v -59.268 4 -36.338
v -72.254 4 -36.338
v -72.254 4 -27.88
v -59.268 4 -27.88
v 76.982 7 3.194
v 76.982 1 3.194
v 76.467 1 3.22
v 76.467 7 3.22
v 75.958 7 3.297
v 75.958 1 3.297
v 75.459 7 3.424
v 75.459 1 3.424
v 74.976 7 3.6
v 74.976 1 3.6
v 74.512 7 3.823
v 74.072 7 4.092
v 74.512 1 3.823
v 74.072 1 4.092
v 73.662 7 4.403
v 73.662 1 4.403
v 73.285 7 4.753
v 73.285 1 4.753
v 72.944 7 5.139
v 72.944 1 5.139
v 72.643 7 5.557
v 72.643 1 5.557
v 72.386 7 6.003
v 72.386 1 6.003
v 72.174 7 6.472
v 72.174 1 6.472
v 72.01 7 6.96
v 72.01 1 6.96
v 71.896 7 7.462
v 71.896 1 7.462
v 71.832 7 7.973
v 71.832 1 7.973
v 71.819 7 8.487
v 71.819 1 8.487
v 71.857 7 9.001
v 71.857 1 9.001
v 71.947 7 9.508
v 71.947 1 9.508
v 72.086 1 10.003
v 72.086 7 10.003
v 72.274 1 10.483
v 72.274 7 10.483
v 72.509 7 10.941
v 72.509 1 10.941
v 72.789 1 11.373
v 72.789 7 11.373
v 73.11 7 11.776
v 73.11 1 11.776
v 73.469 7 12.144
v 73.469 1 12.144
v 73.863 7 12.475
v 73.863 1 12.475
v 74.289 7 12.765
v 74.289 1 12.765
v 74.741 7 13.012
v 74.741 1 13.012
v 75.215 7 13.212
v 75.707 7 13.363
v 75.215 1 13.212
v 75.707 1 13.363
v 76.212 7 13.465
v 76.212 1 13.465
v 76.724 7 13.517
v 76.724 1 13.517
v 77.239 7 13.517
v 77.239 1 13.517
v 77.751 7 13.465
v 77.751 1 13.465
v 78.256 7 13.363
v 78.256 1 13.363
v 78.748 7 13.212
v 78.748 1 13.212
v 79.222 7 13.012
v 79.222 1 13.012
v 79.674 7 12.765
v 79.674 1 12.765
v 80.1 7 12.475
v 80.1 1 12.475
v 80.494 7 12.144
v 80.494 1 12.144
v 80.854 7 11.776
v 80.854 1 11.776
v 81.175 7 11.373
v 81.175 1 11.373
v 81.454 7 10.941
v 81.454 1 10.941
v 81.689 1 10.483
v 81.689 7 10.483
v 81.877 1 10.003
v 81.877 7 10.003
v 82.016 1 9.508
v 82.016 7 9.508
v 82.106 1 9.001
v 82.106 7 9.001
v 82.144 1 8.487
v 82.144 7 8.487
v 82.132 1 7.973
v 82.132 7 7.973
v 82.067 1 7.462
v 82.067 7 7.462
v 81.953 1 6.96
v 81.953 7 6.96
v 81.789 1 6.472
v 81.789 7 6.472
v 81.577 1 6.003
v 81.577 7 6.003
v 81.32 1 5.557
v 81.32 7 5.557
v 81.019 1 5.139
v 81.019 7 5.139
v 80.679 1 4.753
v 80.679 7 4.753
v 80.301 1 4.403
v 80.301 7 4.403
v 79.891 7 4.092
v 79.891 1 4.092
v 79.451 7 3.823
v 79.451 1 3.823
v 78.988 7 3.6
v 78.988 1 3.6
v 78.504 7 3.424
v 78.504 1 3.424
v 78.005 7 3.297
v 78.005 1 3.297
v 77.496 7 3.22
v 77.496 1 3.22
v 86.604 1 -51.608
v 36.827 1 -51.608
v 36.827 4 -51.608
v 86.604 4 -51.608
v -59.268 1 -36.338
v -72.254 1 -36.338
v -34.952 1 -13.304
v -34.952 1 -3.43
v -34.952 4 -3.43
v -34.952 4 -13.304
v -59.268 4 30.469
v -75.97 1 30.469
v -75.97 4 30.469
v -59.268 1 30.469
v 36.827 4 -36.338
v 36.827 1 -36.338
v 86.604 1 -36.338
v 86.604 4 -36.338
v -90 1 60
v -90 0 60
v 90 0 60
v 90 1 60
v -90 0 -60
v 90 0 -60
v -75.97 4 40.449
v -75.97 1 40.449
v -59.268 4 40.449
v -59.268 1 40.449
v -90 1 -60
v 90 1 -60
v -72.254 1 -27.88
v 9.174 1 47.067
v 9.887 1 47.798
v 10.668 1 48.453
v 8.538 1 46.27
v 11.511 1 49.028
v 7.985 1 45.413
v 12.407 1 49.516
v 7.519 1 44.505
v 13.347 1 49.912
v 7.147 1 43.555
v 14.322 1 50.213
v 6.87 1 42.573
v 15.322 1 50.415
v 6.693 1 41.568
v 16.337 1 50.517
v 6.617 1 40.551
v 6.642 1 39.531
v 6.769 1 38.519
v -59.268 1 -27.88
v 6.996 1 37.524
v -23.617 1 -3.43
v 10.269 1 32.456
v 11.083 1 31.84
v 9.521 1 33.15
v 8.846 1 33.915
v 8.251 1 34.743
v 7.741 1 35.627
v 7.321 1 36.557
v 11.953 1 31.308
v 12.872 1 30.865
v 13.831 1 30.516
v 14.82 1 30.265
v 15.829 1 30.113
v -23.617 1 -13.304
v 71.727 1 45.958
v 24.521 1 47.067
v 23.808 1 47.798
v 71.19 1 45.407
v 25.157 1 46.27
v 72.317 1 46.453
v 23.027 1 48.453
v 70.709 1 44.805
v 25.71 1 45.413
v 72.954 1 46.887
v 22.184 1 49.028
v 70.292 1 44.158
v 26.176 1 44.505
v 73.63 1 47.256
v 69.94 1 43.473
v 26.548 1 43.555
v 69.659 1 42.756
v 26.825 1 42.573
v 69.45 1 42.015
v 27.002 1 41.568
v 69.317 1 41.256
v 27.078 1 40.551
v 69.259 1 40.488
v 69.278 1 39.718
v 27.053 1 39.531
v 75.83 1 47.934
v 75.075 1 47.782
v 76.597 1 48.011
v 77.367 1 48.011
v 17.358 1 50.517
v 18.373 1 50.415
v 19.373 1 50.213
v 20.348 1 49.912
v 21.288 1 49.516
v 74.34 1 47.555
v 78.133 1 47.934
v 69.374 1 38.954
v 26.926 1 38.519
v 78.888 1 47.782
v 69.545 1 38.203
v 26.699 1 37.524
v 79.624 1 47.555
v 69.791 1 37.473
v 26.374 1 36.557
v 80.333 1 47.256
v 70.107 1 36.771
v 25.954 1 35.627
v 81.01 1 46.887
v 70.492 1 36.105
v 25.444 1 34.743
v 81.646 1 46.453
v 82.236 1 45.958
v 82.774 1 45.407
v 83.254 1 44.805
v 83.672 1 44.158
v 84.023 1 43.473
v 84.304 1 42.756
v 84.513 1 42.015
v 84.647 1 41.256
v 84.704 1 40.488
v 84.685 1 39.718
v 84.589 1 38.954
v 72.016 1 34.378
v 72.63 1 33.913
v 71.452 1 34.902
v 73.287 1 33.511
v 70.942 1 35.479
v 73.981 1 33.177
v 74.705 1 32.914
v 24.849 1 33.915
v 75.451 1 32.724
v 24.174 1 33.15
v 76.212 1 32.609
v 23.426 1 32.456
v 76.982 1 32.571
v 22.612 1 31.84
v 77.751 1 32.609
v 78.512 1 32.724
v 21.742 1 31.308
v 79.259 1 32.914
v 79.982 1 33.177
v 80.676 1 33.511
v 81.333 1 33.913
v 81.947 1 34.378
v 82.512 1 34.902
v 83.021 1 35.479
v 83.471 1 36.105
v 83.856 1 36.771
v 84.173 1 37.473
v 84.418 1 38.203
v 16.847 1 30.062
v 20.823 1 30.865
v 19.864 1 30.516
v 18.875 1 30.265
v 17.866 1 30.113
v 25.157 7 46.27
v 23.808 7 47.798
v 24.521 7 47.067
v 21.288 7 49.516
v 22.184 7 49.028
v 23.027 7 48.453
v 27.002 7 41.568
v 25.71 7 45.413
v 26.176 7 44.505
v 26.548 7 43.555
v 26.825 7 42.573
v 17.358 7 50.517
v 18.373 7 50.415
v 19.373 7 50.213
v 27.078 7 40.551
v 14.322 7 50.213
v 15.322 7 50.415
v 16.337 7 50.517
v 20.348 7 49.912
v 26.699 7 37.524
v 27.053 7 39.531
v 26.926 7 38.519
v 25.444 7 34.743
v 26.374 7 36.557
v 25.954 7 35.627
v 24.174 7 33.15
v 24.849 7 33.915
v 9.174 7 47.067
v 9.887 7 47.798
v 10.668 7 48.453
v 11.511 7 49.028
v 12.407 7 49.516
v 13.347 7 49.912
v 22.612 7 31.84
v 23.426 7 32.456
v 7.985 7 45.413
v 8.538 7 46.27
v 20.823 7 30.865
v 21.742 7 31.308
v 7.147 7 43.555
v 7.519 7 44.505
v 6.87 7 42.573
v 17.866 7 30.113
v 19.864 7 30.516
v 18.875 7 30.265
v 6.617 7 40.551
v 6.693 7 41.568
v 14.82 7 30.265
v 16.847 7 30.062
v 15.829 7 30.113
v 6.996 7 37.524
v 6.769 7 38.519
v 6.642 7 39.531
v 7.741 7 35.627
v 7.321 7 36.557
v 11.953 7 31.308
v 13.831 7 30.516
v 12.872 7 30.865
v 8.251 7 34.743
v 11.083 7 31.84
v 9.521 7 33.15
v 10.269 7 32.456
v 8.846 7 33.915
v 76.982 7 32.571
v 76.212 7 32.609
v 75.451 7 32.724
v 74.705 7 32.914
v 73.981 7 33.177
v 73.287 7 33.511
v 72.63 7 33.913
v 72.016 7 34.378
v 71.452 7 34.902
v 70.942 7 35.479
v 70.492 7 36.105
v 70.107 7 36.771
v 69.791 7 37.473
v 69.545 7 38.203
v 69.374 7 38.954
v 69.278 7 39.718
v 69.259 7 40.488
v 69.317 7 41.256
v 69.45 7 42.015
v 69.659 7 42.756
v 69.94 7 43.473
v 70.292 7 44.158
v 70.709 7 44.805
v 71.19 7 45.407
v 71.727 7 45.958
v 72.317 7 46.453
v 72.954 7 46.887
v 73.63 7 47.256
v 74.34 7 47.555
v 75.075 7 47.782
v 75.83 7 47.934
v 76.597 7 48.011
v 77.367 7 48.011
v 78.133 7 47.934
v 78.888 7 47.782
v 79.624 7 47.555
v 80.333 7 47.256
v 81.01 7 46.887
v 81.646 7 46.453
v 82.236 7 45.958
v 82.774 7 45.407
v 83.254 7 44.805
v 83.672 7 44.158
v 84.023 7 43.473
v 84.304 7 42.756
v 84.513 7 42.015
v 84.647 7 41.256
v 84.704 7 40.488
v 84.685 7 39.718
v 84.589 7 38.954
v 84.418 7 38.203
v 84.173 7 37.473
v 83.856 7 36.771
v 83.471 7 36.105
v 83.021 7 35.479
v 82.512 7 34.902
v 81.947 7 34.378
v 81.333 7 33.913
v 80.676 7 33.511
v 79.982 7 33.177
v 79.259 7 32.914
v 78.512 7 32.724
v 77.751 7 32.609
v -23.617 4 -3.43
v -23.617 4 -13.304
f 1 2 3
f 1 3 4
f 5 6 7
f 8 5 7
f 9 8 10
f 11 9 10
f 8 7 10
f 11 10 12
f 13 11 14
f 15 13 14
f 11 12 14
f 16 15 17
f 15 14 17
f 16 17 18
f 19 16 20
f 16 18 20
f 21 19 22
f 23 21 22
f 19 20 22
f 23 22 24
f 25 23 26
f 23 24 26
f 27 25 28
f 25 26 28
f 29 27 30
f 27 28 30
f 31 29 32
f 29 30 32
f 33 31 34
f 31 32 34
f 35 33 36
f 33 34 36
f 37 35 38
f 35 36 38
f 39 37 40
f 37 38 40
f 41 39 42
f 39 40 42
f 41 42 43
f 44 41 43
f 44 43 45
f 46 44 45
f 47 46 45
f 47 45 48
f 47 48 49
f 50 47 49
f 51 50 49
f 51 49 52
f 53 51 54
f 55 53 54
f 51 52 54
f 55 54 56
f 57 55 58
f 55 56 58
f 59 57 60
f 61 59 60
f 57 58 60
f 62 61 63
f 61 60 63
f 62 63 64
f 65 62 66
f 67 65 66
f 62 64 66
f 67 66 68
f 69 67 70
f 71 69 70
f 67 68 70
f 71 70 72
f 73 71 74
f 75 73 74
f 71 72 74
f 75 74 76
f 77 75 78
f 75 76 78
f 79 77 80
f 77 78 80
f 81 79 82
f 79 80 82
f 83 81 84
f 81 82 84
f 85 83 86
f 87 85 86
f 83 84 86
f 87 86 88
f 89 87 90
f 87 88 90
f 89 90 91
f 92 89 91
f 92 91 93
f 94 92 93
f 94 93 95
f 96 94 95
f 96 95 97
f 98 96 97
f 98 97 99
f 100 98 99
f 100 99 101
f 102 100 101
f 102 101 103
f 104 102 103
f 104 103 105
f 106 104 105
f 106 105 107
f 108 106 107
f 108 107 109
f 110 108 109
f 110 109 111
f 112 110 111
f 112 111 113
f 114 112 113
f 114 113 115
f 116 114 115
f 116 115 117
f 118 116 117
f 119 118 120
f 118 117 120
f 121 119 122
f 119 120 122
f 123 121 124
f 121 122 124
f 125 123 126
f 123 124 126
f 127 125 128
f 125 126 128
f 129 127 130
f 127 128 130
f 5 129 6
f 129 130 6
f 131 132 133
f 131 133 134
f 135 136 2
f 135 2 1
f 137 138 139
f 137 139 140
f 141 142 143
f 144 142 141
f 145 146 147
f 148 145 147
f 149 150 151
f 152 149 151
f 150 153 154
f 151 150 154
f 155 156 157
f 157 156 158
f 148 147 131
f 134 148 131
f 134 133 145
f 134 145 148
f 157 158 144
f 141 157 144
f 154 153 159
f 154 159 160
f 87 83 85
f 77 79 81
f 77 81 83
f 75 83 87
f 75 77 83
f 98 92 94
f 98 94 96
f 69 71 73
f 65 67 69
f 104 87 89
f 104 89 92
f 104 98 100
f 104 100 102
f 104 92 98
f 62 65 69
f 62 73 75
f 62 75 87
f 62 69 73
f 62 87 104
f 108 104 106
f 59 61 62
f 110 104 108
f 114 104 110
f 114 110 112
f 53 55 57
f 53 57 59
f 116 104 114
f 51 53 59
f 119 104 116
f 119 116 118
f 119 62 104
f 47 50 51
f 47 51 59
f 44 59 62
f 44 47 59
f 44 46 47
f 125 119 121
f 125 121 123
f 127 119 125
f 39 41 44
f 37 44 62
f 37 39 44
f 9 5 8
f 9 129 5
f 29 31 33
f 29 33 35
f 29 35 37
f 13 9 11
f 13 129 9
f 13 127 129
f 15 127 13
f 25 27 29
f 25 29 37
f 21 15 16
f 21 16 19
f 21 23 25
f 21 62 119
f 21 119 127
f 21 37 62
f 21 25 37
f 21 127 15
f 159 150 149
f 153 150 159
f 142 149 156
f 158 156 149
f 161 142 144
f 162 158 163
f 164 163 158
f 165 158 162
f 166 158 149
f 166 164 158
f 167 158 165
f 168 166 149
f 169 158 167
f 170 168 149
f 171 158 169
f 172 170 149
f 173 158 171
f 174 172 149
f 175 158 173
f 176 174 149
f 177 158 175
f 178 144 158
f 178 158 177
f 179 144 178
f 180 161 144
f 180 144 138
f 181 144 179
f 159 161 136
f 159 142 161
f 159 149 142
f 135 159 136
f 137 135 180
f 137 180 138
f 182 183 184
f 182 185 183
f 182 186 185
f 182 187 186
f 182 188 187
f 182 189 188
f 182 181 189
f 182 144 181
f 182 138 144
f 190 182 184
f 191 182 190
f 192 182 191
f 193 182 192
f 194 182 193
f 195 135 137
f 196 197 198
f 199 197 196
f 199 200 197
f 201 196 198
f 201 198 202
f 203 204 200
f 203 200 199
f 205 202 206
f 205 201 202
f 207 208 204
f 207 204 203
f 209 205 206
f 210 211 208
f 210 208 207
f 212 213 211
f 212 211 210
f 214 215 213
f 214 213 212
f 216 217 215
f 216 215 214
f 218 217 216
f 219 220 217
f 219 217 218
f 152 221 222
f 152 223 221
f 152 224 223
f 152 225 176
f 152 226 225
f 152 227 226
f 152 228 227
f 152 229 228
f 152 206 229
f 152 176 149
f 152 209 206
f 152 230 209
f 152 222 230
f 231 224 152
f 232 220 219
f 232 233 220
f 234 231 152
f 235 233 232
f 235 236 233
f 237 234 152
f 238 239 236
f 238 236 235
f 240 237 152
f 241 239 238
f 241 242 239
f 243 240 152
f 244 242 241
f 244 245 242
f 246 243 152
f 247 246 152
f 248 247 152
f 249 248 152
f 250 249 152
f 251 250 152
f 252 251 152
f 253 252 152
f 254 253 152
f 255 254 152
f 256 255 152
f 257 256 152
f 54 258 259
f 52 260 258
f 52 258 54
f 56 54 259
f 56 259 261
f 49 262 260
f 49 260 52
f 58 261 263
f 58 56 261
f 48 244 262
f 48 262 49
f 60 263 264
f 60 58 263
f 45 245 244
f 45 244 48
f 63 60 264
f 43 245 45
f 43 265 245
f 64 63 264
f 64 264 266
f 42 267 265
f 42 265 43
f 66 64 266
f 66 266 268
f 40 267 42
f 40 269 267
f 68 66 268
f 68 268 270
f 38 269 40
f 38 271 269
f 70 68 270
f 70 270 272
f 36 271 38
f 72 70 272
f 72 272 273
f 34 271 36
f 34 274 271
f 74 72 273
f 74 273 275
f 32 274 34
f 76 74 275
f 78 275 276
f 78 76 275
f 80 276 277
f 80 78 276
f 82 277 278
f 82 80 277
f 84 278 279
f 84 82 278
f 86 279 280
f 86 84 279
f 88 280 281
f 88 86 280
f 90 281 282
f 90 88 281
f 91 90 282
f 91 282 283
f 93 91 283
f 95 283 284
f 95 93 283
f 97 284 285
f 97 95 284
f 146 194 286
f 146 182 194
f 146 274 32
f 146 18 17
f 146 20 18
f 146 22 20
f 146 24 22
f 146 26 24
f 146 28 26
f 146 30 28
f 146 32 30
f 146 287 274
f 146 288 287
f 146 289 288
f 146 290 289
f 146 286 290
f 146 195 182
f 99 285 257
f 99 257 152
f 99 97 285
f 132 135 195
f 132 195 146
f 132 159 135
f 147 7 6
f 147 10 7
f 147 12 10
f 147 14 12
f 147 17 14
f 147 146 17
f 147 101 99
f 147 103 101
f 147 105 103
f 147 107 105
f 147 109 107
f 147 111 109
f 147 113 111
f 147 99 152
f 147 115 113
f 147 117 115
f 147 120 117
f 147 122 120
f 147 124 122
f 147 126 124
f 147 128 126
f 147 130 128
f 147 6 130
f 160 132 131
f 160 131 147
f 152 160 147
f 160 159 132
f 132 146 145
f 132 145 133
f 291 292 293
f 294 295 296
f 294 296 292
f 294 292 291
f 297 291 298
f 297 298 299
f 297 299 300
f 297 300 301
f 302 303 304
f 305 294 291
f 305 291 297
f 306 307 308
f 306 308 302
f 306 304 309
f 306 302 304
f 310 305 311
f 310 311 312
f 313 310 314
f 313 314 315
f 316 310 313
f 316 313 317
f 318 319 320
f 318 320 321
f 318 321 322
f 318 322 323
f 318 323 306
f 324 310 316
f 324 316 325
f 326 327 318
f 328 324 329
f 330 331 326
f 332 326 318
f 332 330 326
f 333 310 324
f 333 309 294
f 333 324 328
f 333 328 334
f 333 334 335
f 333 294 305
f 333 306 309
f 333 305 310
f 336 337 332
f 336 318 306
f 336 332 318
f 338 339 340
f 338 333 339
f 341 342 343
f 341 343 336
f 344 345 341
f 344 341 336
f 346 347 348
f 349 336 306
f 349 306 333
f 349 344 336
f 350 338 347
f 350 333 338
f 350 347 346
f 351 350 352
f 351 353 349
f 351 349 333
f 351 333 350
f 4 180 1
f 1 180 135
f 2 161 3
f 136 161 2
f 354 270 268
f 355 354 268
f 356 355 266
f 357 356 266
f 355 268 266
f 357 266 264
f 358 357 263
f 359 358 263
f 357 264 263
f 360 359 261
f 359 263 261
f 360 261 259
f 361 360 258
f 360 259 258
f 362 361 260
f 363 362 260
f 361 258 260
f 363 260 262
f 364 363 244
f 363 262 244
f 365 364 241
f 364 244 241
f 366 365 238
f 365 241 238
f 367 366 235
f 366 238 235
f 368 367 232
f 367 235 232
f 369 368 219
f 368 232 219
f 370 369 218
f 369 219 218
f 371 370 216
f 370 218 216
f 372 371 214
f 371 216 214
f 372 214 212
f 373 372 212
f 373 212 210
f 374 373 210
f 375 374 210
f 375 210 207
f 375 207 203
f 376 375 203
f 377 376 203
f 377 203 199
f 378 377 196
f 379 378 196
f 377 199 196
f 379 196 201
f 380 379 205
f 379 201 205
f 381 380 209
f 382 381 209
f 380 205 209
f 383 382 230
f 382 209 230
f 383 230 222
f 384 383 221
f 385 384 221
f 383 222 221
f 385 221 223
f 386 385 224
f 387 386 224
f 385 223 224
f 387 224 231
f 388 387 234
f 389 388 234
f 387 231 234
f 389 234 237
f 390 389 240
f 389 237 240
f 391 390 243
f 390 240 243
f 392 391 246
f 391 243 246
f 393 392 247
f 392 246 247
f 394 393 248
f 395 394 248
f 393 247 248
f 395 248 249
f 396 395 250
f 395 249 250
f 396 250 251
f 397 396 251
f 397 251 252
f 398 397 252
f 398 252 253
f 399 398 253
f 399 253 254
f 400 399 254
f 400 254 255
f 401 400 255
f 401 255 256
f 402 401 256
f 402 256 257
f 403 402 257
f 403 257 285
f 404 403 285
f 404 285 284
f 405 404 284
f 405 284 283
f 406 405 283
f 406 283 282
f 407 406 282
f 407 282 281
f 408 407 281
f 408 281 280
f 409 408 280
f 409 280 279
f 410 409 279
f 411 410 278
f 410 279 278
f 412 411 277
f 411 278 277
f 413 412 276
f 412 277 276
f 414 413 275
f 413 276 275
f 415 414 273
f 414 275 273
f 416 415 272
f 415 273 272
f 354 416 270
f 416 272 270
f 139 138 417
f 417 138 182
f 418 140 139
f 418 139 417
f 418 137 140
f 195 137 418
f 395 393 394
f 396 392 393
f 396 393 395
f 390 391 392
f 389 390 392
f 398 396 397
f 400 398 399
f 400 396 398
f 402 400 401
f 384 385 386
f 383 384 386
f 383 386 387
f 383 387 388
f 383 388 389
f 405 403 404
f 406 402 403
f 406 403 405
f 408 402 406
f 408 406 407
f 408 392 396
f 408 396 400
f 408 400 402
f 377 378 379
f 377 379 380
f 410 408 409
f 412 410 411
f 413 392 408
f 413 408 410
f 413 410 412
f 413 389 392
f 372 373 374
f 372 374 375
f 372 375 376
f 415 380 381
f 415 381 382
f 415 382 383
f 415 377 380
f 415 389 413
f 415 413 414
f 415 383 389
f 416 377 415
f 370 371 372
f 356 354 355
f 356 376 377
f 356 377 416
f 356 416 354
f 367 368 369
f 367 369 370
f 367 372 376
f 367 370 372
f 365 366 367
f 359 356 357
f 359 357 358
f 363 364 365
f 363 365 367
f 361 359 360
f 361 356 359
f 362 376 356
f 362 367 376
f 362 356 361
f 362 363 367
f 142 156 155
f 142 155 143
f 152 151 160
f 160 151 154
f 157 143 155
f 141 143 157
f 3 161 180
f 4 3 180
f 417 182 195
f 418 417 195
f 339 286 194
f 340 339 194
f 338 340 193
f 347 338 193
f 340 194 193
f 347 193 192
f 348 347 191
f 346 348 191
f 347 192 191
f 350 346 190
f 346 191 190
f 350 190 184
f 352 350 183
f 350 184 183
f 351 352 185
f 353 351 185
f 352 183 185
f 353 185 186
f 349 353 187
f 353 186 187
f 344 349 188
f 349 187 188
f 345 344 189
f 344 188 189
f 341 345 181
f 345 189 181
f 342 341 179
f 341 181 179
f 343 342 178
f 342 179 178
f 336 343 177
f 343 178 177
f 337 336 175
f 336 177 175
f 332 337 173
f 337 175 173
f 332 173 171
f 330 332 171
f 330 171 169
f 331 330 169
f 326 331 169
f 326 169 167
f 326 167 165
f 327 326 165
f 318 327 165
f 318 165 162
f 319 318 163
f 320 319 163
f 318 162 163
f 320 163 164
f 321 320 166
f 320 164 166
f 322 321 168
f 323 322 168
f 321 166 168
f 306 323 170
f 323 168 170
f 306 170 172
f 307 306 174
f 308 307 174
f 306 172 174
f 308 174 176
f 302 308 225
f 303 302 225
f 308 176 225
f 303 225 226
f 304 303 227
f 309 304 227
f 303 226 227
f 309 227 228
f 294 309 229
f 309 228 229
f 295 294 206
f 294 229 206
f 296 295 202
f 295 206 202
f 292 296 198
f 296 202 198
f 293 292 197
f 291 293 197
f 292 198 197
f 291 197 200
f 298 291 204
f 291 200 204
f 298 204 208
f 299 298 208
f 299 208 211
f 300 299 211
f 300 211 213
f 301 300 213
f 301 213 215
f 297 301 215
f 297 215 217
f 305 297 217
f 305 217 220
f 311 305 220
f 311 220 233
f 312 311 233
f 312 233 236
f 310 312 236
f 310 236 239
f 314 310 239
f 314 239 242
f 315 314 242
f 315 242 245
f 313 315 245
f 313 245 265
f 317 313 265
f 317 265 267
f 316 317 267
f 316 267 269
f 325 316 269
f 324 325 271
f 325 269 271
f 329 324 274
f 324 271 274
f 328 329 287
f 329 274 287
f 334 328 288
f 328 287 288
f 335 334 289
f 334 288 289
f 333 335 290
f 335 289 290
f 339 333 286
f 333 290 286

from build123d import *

# Parameters (mm, degrees)
SKETCH_1_W      = 180
SKETCH_1_H      = 120
EXTRUDE_1_DEPTH = 1
SKETCH_2_W      = 12.985294312
SKETCH_2_H      = 8.457960927
SKETCH_2_W_2    = 16.701200635
SKETCH_2_H_2    = 9.980115798
SKETCH_2_W_3    = 11.334837972
SKETCH_2_H_3    = 9.873617341
SKETCH_2_W_4    = 49.777064572
SKETCH_2_H_4    = 15.269655747
EXTRUDE_2_DEPTH = 3
SKETCH_3_R      = 5.164314182
SKETCH_3_R_2    = 7.724932849
SKETCH_3_R_3    = 10.233859985
EXTRUDE_3_DEPTH = 6


with BuildPart() as part:
    # 草图1 → 凸台-拉伸1 (new body)
    with BuildSketch(Plane(origin=(0, 0, 0), x_dir=(1, 0, 0), z_dir=(0, 1, 0))):
        Rectangle(SKETCH_1_W, SKETCH_1_H)
    extrude(amount=EXTRUDE_1_DEPTH)

    # 草图2 → 凸台-拉伸2 (add)
    with BuildSketch(Plane(origin=(0, 1, 0), x_dir=(1, 0, 0), z_dir=(0, 1, 0))):
        with Locations((-65.761091414, 32.109327308)):
            Rectangle(SKETCH_2_W, SKETCH_2_H)
        with Locations((-67.619044575, -35.458648807)):
            Rectangle(SKETCH_2_W_2, SKETCH_2_H_2)
        with Locations((-29.284234399, 8.367215504)):
            Rectangle(SKETCH_2_W_3, SKETCH_2_H_3)
        with Locations((61.715173055, 43.973135646)):
            Rectangle(SKETCH_2_W_4, SKETCH_2_H_4)
    extrude(amount=EXTRUDE_2_DEPTH)

    # 草图3 → 凸台-拉伸3 (add)
    with BuildSketch(Plane(origin=(0, 1, 0), x_dir=(1, 0, 0), z_dir=(0, 1, 0))):
        with Locations(Location((76.981635132, -8.358638316, 0), (0, 0, 90))):
            Circle(SKETCH_3_R)
        with Locations(Location((76.981635132, -40.295684365, 0), (0, 0, 90))):
            Circle(SKETCH_3_R_2)
        with Locations(Location((16.847486271, -40.295684365, 0), (0, 0, 90))):
            Circle(SKETCH_3_R_3)
    extrude(amount=EXTRUDE_3_DEPTH)


solid = part.part
